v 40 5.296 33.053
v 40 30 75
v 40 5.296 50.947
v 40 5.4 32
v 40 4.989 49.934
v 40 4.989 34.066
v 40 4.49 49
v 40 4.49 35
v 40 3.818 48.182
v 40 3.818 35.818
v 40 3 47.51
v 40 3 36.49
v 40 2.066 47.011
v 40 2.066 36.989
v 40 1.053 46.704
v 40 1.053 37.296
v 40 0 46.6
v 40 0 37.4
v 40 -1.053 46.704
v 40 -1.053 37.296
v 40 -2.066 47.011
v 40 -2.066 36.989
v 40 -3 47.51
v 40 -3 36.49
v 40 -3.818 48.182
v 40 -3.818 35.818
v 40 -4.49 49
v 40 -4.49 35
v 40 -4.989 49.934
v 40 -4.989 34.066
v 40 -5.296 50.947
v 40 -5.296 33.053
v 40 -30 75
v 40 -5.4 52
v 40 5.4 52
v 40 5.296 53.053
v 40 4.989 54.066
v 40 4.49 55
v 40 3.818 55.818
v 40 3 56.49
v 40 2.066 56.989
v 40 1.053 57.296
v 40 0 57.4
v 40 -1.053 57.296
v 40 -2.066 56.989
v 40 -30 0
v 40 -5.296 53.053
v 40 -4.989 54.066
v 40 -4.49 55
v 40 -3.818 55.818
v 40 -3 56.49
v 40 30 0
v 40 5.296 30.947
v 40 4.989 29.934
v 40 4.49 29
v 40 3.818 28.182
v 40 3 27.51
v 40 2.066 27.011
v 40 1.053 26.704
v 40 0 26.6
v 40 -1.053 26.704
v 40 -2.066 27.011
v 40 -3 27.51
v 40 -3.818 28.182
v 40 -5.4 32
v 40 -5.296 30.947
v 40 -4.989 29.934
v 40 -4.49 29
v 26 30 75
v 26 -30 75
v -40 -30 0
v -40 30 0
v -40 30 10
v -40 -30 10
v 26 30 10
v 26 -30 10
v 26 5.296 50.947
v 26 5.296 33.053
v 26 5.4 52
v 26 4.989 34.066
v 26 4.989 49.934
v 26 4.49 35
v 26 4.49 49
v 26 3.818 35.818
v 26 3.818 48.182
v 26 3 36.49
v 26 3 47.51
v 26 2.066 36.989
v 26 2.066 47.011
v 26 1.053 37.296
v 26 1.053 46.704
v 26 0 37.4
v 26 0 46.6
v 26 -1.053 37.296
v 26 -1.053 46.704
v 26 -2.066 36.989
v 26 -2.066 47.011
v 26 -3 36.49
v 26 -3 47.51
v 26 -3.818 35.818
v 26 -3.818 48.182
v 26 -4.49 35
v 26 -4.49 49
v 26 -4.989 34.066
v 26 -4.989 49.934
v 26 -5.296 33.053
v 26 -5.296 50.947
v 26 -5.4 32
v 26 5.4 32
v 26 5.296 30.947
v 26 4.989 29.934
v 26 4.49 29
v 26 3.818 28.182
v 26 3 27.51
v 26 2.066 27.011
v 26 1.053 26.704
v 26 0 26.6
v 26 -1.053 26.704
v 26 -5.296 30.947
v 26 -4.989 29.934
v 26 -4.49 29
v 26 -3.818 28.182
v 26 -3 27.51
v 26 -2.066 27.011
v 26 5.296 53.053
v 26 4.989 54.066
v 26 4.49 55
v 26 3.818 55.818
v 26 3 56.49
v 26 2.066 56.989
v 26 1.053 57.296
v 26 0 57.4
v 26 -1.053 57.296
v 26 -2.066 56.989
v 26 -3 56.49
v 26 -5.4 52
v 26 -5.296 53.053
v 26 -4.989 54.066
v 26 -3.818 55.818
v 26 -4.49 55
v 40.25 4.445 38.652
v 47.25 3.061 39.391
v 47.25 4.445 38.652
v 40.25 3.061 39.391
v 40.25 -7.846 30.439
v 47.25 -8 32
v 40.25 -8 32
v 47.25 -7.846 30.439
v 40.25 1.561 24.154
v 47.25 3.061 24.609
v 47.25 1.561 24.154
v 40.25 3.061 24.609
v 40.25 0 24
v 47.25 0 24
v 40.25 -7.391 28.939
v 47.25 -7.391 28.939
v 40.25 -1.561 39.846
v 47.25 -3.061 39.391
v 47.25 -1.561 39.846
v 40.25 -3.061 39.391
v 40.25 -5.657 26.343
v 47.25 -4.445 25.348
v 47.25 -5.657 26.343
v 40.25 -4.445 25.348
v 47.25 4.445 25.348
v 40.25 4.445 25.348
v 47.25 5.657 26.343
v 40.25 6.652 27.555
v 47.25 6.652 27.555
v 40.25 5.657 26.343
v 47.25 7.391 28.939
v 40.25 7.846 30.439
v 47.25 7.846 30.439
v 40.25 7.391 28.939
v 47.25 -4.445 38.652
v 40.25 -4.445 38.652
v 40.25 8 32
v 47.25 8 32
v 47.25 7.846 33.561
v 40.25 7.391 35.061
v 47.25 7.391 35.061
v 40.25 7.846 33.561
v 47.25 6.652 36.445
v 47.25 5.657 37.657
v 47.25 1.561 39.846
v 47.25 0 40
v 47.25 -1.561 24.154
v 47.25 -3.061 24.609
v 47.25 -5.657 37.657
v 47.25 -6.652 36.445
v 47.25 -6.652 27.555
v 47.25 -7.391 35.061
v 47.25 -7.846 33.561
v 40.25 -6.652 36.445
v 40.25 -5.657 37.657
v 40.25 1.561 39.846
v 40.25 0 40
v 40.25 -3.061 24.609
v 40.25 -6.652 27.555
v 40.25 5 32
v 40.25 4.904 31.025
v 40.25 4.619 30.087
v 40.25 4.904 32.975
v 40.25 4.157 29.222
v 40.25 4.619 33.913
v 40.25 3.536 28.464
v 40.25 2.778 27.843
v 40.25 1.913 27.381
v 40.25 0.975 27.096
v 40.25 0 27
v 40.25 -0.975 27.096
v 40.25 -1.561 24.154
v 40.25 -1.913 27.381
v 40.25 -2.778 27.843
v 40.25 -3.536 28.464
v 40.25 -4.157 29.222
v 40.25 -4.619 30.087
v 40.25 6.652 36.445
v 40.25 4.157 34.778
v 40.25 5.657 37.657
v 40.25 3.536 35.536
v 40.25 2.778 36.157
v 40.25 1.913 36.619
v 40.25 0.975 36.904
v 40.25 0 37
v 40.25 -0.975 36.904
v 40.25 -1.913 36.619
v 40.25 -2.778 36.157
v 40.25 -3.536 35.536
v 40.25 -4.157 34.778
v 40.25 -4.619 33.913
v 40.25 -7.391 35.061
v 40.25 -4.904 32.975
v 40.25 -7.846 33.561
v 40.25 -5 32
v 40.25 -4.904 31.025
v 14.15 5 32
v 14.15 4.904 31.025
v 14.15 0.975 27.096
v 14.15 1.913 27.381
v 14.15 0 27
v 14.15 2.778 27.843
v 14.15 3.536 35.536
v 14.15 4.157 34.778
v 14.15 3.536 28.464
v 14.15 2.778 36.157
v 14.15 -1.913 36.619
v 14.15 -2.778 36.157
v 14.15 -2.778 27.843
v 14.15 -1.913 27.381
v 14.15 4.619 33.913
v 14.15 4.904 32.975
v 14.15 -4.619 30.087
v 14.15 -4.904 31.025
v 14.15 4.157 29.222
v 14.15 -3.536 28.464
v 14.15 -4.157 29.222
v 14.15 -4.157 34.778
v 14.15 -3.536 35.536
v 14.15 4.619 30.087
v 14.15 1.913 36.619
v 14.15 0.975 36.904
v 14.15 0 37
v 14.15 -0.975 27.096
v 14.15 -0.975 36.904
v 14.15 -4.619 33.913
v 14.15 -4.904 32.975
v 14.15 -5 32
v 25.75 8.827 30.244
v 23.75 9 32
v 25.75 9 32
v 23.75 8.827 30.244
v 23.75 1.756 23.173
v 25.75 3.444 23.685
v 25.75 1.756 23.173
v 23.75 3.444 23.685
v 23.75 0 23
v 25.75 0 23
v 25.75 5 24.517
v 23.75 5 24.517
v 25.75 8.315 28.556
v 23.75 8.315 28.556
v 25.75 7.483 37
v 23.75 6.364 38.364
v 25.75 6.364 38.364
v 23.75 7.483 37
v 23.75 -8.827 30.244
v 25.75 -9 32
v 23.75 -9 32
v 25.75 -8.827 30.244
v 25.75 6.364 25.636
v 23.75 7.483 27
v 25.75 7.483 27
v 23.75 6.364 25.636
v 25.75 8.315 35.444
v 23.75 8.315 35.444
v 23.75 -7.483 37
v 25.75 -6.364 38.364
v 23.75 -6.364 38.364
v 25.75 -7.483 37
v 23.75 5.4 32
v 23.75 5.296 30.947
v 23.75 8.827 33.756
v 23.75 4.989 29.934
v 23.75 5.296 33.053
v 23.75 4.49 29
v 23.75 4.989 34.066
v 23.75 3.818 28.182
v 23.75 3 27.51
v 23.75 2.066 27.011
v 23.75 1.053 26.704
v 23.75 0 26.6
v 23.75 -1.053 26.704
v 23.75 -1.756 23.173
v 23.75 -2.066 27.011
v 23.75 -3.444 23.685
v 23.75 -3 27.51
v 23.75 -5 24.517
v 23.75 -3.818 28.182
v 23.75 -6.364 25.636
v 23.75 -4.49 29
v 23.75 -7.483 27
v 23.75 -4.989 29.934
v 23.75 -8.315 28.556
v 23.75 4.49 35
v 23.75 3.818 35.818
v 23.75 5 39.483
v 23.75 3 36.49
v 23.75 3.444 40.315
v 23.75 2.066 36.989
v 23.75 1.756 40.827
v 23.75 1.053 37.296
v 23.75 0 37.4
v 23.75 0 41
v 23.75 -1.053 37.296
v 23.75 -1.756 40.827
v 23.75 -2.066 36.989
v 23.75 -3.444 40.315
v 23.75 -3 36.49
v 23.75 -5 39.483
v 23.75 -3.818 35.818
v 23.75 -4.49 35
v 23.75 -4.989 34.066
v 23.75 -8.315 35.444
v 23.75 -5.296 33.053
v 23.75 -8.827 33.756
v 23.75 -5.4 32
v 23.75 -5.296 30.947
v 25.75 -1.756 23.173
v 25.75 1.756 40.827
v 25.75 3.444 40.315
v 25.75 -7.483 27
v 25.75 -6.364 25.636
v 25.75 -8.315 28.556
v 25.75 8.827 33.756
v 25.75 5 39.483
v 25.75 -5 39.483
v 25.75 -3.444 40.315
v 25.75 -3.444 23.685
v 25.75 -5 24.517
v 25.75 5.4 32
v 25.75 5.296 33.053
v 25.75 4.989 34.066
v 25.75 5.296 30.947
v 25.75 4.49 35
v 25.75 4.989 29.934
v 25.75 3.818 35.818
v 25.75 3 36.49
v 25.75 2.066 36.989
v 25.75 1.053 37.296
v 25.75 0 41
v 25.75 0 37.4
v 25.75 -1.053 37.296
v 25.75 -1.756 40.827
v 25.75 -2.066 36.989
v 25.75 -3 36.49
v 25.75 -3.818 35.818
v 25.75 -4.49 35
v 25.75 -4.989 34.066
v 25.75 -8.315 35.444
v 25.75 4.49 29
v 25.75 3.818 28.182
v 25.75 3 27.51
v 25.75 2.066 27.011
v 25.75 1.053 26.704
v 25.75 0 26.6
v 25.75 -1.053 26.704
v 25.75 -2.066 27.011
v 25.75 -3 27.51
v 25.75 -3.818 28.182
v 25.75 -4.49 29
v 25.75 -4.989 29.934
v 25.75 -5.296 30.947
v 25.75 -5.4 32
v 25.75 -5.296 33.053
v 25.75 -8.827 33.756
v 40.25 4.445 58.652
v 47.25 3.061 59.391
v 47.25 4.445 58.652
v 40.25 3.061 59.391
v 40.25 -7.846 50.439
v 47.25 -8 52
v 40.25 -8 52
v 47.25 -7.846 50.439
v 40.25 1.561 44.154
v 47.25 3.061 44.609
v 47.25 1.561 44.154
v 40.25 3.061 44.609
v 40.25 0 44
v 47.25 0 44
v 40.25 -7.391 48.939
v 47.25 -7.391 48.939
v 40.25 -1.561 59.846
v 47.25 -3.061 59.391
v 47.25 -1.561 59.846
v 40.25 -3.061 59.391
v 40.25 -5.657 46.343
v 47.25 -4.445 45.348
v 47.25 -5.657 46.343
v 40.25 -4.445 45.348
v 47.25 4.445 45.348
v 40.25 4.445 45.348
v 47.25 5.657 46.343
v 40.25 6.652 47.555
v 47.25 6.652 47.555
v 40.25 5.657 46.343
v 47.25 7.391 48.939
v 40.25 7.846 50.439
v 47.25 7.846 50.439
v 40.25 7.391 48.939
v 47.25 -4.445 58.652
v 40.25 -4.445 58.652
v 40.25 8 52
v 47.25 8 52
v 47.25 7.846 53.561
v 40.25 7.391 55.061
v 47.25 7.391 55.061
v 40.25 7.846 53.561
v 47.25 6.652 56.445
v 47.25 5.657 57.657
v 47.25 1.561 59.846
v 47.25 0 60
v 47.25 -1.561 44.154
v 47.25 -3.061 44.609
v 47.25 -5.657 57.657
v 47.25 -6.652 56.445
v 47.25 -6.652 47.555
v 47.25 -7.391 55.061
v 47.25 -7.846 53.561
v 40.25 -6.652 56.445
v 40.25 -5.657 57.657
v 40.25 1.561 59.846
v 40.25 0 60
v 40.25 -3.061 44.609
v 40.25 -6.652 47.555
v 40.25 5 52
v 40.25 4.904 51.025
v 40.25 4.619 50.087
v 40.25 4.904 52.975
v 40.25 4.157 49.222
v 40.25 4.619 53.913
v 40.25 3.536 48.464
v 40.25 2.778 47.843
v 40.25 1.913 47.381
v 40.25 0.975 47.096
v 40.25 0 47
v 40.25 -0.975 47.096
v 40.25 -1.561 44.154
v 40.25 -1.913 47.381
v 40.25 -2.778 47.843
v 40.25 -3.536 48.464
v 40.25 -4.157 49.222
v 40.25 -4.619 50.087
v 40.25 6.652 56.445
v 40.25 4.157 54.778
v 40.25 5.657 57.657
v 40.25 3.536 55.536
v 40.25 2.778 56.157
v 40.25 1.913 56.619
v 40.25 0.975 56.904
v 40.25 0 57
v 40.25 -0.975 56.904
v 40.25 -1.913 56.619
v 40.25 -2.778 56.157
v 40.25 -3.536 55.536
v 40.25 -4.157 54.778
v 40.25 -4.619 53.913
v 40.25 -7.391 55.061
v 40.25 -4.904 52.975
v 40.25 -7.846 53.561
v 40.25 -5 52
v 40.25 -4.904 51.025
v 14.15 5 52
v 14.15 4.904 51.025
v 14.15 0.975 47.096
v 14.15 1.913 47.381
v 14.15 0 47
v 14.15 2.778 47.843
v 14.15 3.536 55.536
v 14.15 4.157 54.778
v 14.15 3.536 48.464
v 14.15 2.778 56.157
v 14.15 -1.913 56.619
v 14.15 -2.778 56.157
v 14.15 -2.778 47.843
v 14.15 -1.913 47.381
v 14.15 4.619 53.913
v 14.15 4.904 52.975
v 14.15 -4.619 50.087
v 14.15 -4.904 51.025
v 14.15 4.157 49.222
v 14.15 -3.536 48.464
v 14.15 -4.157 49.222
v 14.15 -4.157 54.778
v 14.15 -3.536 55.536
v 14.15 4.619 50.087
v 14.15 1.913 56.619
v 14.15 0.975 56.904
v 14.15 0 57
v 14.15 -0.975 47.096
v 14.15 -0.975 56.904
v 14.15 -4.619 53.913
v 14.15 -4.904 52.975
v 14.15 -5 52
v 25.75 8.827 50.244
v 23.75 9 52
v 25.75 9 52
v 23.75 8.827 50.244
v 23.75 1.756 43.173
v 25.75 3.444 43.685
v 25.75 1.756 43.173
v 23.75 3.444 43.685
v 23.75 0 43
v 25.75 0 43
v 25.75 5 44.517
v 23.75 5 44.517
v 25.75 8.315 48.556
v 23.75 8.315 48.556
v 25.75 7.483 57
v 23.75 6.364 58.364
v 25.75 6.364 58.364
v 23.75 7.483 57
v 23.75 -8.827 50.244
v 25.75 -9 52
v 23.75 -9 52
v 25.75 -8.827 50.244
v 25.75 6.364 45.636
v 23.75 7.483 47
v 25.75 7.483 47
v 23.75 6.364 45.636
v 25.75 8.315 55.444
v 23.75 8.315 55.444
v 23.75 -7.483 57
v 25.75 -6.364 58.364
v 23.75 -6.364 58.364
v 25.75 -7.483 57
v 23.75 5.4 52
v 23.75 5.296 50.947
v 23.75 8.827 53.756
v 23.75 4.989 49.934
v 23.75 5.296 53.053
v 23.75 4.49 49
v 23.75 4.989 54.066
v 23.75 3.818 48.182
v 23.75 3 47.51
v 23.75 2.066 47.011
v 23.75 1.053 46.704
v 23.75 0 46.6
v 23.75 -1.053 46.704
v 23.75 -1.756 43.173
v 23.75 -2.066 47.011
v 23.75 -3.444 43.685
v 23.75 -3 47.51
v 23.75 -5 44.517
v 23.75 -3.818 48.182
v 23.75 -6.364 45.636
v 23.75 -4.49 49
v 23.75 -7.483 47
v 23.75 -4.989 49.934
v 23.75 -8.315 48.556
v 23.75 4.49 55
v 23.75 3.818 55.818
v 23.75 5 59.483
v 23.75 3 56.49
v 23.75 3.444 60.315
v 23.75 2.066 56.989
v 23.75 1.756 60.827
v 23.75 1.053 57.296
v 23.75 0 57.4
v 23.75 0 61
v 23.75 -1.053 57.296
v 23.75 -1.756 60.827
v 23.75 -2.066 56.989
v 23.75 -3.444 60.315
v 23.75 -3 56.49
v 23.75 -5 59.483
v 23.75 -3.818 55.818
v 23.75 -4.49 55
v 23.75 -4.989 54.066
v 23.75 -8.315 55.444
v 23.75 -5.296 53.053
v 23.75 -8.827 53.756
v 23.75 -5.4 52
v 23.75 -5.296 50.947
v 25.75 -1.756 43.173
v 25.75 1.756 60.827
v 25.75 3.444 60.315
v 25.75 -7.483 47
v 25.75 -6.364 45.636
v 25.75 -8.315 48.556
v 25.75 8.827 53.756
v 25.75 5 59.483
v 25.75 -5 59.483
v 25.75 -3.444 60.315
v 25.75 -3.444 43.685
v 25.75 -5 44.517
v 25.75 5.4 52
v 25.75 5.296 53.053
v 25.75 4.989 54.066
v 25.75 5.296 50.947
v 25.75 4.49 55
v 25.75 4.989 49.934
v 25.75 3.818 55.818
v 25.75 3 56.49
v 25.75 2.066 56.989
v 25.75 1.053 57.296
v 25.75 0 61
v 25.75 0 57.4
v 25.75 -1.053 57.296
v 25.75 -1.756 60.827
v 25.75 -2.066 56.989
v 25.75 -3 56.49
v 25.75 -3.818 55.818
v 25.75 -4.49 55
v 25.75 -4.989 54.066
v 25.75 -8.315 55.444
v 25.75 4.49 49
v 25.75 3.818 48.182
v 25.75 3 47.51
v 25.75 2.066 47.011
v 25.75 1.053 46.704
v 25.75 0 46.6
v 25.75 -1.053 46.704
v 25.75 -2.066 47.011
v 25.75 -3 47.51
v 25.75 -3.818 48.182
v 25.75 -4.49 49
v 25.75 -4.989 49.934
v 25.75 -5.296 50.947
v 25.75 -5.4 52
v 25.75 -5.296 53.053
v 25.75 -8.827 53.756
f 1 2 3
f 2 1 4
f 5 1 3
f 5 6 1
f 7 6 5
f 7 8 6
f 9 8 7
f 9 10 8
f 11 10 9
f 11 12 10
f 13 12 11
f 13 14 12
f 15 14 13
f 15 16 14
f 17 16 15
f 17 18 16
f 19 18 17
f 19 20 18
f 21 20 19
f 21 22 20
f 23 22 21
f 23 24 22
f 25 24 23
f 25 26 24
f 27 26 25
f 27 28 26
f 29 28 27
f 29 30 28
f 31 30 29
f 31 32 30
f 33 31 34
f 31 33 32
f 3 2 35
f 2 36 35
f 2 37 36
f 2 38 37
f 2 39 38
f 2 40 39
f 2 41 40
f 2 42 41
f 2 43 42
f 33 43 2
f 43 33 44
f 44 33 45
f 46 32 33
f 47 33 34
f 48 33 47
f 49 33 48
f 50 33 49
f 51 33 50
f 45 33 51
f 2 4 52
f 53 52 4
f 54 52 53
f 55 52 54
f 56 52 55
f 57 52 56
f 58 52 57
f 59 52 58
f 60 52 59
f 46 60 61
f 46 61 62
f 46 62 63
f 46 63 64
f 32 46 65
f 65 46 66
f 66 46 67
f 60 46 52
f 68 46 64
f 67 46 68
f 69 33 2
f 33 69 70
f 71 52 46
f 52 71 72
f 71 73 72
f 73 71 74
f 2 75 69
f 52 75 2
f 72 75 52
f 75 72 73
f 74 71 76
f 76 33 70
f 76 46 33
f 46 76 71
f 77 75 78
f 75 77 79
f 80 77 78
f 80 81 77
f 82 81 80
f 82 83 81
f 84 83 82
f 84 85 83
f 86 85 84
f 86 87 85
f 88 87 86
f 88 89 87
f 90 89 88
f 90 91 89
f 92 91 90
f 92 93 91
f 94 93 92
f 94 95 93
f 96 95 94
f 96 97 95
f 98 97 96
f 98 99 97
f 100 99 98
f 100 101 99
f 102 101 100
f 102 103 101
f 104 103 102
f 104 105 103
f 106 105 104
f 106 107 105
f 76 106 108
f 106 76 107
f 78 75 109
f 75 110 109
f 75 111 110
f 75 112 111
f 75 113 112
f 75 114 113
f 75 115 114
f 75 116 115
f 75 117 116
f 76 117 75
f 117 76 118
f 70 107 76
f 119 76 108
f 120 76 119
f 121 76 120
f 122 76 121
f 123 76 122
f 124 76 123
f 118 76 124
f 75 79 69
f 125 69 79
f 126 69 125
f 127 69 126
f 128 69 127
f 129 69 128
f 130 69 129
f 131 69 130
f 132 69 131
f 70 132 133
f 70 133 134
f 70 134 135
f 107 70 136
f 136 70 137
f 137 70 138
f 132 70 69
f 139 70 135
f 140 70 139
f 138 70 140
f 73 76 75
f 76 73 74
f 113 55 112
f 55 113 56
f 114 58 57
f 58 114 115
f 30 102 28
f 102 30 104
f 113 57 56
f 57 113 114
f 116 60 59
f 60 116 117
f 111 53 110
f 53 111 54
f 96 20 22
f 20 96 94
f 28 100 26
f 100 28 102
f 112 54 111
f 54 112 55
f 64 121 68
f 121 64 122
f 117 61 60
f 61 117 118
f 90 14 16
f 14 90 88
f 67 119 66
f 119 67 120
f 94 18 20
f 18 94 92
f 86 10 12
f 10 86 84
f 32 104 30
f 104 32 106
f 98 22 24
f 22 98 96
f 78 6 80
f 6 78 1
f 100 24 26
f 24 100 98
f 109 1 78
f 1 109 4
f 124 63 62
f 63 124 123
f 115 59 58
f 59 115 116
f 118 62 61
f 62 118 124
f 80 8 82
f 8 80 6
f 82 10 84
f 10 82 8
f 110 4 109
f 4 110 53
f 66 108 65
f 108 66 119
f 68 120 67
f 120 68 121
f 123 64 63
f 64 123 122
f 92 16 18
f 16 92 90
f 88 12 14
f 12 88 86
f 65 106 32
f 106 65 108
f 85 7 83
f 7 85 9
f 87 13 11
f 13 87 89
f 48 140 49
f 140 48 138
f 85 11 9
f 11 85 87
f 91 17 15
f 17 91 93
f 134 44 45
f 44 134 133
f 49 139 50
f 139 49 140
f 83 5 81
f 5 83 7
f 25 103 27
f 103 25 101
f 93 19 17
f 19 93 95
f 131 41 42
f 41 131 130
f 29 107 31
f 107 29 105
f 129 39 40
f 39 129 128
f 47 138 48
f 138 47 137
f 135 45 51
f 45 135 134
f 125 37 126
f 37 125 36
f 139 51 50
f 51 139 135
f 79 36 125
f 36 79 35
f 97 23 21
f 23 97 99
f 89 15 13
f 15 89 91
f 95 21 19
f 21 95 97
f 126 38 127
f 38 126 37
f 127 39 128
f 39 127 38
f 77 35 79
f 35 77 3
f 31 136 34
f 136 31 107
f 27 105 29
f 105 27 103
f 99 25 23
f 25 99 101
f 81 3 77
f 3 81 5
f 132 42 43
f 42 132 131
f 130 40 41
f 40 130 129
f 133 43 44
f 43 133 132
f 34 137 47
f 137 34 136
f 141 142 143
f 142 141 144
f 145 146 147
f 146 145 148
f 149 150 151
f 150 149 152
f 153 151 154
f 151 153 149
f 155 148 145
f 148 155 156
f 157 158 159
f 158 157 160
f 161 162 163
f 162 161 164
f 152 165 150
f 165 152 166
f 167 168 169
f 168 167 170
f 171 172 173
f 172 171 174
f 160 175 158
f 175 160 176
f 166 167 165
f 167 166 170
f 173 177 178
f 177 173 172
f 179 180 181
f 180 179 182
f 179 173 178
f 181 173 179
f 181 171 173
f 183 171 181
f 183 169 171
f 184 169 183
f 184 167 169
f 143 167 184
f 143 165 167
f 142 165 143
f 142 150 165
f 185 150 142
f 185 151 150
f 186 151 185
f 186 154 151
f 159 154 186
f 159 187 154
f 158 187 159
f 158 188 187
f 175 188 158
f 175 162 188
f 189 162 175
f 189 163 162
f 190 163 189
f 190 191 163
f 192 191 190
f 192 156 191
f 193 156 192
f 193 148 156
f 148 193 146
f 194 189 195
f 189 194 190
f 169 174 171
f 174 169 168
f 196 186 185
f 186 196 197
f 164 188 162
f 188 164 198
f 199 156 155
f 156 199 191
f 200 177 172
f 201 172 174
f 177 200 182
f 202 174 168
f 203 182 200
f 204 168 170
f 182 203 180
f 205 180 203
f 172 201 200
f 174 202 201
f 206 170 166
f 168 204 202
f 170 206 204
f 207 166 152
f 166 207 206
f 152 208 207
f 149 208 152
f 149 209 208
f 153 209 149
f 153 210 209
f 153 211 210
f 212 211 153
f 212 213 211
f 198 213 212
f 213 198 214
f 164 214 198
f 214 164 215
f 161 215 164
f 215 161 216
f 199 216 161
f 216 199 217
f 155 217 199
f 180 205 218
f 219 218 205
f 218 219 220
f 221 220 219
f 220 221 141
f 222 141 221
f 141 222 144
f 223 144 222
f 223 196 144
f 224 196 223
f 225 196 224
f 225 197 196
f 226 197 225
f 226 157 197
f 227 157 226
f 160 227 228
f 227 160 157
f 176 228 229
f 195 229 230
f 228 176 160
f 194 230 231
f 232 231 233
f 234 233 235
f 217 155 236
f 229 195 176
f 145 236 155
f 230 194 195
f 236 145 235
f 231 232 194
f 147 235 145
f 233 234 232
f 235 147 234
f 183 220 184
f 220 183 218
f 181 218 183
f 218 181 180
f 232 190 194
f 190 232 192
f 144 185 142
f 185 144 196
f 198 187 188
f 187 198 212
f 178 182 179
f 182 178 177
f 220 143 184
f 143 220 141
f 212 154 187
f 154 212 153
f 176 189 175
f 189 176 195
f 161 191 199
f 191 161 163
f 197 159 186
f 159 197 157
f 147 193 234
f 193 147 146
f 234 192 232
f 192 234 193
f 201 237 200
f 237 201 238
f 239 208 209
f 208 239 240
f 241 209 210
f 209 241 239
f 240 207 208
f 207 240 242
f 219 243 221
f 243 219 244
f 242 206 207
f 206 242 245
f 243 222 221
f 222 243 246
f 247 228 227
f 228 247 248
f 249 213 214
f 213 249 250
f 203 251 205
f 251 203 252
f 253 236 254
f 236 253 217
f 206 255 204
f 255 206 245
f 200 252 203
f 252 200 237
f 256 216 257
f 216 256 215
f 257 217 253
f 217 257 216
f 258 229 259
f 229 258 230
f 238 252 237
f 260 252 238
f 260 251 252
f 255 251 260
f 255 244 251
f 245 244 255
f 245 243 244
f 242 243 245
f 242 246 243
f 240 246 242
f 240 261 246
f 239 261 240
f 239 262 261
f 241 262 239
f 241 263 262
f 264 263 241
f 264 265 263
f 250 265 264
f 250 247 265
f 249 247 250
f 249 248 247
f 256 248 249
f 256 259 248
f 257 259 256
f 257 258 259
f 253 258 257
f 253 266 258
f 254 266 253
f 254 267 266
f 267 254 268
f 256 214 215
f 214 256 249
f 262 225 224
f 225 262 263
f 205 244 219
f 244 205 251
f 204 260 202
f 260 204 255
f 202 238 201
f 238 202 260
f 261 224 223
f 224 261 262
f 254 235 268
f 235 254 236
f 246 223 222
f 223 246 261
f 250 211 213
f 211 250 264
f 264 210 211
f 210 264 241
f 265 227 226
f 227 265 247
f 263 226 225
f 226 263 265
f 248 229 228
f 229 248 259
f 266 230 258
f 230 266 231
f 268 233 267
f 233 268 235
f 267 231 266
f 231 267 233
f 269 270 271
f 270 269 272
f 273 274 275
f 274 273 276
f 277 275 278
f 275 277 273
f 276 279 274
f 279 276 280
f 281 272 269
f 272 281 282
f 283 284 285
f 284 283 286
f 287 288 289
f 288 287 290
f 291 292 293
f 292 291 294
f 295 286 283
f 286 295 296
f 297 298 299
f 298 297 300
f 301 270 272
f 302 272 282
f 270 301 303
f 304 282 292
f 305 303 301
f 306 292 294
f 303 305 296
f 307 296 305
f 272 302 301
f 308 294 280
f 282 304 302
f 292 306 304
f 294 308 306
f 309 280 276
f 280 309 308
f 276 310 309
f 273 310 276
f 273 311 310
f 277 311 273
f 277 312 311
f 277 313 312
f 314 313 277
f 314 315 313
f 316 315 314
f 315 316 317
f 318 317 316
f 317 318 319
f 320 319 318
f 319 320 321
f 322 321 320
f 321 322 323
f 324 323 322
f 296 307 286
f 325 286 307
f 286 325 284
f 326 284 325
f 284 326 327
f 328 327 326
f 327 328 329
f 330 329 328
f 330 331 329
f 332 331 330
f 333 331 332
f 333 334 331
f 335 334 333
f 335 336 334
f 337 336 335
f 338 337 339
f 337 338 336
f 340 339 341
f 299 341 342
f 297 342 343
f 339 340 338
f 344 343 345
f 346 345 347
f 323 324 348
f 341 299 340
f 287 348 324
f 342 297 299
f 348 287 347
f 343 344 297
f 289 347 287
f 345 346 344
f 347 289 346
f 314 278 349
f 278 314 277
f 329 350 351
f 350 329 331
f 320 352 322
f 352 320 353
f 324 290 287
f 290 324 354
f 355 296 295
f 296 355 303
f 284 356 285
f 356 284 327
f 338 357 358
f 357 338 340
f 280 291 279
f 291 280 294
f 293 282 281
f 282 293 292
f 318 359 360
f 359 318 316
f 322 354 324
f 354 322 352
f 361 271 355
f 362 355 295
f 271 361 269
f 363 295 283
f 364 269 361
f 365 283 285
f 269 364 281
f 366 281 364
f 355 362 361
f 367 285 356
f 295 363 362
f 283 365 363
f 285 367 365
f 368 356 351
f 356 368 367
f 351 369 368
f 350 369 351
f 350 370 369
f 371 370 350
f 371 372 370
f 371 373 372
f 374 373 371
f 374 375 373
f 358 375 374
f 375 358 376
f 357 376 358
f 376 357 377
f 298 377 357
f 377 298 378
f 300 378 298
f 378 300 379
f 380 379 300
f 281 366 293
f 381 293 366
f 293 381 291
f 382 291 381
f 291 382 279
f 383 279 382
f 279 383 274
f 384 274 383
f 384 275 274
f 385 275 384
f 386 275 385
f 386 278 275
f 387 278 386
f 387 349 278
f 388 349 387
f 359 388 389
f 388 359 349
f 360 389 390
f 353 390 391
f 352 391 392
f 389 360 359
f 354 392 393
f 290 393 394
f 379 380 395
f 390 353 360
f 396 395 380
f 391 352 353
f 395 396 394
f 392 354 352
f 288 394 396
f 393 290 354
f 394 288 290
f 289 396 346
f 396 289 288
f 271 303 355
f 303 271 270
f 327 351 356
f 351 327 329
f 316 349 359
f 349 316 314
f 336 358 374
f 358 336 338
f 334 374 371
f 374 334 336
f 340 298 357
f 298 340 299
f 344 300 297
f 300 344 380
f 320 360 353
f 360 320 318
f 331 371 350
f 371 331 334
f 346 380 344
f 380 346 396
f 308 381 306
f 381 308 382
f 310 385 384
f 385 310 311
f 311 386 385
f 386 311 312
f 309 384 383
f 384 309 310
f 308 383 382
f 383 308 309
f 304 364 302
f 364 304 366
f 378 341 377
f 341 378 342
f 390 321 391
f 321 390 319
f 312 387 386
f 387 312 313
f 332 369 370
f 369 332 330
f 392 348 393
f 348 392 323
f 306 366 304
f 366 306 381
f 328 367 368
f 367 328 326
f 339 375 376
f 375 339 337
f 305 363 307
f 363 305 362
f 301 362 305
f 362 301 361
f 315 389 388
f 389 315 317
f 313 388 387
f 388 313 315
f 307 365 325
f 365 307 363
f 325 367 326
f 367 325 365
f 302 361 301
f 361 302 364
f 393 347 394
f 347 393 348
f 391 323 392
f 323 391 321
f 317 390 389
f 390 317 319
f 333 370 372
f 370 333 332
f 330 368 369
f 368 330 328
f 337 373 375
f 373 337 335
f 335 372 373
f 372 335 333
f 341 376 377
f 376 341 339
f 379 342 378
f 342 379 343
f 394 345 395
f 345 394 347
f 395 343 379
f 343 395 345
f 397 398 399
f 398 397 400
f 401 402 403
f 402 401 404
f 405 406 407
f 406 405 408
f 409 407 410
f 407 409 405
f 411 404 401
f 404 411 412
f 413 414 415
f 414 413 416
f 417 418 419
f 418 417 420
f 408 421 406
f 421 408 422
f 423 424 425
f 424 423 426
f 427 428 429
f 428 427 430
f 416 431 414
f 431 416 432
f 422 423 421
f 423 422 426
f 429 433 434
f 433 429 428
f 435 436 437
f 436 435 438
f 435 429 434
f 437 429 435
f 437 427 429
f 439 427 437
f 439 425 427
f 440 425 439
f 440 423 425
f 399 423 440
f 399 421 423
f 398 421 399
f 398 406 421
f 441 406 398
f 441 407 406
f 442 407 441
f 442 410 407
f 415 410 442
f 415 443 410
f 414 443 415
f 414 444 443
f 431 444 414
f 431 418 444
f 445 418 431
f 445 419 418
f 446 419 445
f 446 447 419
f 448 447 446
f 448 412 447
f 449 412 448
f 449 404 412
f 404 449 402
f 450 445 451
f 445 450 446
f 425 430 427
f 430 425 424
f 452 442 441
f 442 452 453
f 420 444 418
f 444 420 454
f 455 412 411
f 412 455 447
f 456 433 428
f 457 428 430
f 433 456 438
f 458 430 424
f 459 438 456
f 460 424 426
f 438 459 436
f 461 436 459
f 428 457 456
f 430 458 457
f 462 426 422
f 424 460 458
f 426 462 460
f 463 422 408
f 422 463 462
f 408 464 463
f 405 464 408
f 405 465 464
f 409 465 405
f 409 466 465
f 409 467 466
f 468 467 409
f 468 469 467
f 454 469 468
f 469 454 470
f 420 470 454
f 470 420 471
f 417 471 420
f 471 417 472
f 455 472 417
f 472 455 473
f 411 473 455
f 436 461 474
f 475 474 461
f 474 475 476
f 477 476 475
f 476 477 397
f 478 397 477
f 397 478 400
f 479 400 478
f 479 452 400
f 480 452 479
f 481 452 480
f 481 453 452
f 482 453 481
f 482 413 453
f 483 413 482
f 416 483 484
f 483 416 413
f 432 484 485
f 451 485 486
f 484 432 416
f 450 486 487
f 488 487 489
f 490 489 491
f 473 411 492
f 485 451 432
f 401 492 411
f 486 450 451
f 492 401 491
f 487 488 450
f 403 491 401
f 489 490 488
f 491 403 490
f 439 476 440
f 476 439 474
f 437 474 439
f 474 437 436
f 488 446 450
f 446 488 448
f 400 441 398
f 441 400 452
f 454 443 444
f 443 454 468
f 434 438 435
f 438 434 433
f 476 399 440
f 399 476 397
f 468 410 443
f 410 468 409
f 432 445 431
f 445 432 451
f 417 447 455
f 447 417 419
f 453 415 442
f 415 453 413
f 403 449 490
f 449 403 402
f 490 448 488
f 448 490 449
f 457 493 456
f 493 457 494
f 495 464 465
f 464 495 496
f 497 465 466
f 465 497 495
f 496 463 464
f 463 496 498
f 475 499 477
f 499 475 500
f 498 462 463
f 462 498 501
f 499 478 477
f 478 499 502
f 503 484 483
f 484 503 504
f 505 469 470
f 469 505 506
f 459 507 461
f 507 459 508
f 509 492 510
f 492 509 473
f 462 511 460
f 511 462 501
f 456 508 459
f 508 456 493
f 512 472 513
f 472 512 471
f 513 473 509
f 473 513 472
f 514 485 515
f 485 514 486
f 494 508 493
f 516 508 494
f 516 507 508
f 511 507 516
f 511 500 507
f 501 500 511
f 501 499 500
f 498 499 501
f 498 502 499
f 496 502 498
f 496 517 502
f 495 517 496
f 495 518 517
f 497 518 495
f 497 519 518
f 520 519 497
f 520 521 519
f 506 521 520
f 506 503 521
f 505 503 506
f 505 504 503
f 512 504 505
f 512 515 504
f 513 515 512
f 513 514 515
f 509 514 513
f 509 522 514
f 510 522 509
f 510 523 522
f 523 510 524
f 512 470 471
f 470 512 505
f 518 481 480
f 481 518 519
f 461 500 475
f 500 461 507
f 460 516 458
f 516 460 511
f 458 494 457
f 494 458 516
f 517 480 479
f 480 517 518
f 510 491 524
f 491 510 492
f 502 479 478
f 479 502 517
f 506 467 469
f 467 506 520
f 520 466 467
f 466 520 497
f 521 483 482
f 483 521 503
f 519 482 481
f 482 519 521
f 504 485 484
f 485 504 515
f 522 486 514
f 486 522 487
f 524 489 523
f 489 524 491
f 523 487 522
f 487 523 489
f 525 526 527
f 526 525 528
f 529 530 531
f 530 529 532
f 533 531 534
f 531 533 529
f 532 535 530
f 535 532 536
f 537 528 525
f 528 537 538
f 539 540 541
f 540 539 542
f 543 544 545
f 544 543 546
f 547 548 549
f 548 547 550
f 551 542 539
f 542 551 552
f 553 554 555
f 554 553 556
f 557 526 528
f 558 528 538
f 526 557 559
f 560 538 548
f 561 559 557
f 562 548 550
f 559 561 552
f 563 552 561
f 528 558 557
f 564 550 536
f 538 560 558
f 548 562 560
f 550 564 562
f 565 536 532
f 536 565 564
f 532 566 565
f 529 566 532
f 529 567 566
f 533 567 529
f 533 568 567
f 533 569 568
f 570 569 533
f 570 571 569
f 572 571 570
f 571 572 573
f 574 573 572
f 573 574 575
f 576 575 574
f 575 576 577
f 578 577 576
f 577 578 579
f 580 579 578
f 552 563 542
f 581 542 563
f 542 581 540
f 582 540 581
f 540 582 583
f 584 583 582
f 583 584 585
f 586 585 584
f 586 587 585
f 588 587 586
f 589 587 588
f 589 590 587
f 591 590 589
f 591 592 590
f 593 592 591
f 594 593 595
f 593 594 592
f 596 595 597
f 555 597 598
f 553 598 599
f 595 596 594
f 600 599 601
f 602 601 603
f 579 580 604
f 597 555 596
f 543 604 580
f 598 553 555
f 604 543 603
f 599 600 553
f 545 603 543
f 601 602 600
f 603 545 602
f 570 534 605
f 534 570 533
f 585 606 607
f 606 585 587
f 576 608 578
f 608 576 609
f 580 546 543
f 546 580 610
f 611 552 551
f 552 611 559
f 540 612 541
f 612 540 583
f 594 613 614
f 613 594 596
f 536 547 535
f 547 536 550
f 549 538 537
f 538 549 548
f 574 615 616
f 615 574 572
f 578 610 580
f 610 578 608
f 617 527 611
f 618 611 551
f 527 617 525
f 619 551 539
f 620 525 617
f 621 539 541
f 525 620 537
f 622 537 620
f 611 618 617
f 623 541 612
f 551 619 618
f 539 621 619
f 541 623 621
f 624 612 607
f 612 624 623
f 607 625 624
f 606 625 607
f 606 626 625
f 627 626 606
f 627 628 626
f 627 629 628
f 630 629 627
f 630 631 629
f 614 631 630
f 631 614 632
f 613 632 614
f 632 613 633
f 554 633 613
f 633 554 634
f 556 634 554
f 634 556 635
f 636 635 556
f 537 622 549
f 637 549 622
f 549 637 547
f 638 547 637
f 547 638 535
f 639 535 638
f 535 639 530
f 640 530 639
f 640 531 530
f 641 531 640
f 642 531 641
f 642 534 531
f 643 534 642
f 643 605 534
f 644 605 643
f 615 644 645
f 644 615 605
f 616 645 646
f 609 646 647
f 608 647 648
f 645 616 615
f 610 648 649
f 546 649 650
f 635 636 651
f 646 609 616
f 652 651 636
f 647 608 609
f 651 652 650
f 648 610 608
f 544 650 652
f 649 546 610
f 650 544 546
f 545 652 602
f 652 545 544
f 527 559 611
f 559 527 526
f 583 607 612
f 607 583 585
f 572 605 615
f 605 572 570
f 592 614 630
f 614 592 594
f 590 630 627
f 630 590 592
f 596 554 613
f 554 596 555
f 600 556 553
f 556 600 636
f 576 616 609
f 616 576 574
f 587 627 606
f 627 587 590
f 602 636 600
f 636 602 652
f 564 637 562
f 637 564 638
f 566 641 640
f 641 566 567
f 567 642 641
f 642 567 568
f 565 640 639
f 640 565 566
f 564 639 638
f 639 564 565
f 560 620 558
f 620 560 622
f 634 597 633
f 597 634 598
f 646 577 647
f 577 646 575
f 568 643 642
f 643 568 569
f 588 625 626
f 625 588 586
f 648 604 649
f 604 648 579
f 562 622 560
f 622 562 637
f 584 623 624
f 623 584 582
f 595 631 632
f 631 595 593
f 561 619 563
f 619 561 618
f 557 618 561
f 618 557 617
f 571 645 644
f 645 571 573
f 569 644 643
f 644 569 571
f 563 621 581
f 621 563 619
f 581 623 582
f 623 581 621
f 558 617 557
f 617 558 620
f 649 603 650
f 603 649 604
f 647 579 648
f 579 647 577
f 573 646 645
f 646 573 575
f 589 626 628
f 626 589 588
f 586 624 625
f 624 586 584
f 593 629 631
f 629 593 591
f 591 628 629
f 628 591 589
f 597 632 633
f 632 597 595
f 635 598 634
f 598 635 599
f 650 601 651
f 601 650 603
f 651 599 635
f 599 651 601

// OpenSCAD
$fn = 32;

// ------------------------------------------------------------------------
// Bolted bracket: 80 x 60 mm bracket with 2 bolt joints
// Every part is its own module, assembly() places them once.
// ------------------------------------------------------------------------

// --- part 1 ---
module bracket() {
  difference() {
    translate([-40, -30, 0]) cube([80, 60, 75]);
    translate([-41, -31, 10]) cube([67, 62, 66]);
    translate([33, 0, 32]) rotate([0, 90, 0]) cylinder(h = 16, d = 10.8, center = true);
    translate([33, 0, 52]) rotate([0, 90, 0]) cylinder(h = 16, d = 10.8, center = true);
  }
}

// --- part 2 ---
module bolt1() {
  cylinder(h = 7, d = 16);
  translate([0, 0, -26.1]) cylinder(h = 26.1, d = 10);
}

// --- part 3 ---
module washer1() {
  difference() {
      translate([0, 0, 0]) cylinder(h = 2, d = 18);
      translate([0, 0, -1]) cylinder(h = 4, d = 10.8);
    }
}

// --- part 4 ---
module bolt2() {
  cylinder(h = 7, d = 16);
  translate([0, 0, -26.1]) cylinder(h = 26.1, d = 10);
}

// --- part 5 ---
module washer2() {
  difference() {
      translate([0, 0, 0]) cylinder(h = 2, d = 18);
      translate([0, 0, -1]) cylinder(h = 4, d = 10.8);
    }
}

// --- assembly ---
module assembly() {
  translate([0, 0, 0]) rotate([0, 0, 0]) bracket();
  translate([40.25, 0, 32]) rotate([0, 90, 0]) bolt1();
  translate([23.75, 0, 32]) rotate([0, 90, 0]) washer1();
  translate([40.25, 0, 52]) rotate([0, 90, 0]) bolt2();
  translate([23.75, 0, 52]) rotate([0, 90, 0]) washer2();
}

assembly();
